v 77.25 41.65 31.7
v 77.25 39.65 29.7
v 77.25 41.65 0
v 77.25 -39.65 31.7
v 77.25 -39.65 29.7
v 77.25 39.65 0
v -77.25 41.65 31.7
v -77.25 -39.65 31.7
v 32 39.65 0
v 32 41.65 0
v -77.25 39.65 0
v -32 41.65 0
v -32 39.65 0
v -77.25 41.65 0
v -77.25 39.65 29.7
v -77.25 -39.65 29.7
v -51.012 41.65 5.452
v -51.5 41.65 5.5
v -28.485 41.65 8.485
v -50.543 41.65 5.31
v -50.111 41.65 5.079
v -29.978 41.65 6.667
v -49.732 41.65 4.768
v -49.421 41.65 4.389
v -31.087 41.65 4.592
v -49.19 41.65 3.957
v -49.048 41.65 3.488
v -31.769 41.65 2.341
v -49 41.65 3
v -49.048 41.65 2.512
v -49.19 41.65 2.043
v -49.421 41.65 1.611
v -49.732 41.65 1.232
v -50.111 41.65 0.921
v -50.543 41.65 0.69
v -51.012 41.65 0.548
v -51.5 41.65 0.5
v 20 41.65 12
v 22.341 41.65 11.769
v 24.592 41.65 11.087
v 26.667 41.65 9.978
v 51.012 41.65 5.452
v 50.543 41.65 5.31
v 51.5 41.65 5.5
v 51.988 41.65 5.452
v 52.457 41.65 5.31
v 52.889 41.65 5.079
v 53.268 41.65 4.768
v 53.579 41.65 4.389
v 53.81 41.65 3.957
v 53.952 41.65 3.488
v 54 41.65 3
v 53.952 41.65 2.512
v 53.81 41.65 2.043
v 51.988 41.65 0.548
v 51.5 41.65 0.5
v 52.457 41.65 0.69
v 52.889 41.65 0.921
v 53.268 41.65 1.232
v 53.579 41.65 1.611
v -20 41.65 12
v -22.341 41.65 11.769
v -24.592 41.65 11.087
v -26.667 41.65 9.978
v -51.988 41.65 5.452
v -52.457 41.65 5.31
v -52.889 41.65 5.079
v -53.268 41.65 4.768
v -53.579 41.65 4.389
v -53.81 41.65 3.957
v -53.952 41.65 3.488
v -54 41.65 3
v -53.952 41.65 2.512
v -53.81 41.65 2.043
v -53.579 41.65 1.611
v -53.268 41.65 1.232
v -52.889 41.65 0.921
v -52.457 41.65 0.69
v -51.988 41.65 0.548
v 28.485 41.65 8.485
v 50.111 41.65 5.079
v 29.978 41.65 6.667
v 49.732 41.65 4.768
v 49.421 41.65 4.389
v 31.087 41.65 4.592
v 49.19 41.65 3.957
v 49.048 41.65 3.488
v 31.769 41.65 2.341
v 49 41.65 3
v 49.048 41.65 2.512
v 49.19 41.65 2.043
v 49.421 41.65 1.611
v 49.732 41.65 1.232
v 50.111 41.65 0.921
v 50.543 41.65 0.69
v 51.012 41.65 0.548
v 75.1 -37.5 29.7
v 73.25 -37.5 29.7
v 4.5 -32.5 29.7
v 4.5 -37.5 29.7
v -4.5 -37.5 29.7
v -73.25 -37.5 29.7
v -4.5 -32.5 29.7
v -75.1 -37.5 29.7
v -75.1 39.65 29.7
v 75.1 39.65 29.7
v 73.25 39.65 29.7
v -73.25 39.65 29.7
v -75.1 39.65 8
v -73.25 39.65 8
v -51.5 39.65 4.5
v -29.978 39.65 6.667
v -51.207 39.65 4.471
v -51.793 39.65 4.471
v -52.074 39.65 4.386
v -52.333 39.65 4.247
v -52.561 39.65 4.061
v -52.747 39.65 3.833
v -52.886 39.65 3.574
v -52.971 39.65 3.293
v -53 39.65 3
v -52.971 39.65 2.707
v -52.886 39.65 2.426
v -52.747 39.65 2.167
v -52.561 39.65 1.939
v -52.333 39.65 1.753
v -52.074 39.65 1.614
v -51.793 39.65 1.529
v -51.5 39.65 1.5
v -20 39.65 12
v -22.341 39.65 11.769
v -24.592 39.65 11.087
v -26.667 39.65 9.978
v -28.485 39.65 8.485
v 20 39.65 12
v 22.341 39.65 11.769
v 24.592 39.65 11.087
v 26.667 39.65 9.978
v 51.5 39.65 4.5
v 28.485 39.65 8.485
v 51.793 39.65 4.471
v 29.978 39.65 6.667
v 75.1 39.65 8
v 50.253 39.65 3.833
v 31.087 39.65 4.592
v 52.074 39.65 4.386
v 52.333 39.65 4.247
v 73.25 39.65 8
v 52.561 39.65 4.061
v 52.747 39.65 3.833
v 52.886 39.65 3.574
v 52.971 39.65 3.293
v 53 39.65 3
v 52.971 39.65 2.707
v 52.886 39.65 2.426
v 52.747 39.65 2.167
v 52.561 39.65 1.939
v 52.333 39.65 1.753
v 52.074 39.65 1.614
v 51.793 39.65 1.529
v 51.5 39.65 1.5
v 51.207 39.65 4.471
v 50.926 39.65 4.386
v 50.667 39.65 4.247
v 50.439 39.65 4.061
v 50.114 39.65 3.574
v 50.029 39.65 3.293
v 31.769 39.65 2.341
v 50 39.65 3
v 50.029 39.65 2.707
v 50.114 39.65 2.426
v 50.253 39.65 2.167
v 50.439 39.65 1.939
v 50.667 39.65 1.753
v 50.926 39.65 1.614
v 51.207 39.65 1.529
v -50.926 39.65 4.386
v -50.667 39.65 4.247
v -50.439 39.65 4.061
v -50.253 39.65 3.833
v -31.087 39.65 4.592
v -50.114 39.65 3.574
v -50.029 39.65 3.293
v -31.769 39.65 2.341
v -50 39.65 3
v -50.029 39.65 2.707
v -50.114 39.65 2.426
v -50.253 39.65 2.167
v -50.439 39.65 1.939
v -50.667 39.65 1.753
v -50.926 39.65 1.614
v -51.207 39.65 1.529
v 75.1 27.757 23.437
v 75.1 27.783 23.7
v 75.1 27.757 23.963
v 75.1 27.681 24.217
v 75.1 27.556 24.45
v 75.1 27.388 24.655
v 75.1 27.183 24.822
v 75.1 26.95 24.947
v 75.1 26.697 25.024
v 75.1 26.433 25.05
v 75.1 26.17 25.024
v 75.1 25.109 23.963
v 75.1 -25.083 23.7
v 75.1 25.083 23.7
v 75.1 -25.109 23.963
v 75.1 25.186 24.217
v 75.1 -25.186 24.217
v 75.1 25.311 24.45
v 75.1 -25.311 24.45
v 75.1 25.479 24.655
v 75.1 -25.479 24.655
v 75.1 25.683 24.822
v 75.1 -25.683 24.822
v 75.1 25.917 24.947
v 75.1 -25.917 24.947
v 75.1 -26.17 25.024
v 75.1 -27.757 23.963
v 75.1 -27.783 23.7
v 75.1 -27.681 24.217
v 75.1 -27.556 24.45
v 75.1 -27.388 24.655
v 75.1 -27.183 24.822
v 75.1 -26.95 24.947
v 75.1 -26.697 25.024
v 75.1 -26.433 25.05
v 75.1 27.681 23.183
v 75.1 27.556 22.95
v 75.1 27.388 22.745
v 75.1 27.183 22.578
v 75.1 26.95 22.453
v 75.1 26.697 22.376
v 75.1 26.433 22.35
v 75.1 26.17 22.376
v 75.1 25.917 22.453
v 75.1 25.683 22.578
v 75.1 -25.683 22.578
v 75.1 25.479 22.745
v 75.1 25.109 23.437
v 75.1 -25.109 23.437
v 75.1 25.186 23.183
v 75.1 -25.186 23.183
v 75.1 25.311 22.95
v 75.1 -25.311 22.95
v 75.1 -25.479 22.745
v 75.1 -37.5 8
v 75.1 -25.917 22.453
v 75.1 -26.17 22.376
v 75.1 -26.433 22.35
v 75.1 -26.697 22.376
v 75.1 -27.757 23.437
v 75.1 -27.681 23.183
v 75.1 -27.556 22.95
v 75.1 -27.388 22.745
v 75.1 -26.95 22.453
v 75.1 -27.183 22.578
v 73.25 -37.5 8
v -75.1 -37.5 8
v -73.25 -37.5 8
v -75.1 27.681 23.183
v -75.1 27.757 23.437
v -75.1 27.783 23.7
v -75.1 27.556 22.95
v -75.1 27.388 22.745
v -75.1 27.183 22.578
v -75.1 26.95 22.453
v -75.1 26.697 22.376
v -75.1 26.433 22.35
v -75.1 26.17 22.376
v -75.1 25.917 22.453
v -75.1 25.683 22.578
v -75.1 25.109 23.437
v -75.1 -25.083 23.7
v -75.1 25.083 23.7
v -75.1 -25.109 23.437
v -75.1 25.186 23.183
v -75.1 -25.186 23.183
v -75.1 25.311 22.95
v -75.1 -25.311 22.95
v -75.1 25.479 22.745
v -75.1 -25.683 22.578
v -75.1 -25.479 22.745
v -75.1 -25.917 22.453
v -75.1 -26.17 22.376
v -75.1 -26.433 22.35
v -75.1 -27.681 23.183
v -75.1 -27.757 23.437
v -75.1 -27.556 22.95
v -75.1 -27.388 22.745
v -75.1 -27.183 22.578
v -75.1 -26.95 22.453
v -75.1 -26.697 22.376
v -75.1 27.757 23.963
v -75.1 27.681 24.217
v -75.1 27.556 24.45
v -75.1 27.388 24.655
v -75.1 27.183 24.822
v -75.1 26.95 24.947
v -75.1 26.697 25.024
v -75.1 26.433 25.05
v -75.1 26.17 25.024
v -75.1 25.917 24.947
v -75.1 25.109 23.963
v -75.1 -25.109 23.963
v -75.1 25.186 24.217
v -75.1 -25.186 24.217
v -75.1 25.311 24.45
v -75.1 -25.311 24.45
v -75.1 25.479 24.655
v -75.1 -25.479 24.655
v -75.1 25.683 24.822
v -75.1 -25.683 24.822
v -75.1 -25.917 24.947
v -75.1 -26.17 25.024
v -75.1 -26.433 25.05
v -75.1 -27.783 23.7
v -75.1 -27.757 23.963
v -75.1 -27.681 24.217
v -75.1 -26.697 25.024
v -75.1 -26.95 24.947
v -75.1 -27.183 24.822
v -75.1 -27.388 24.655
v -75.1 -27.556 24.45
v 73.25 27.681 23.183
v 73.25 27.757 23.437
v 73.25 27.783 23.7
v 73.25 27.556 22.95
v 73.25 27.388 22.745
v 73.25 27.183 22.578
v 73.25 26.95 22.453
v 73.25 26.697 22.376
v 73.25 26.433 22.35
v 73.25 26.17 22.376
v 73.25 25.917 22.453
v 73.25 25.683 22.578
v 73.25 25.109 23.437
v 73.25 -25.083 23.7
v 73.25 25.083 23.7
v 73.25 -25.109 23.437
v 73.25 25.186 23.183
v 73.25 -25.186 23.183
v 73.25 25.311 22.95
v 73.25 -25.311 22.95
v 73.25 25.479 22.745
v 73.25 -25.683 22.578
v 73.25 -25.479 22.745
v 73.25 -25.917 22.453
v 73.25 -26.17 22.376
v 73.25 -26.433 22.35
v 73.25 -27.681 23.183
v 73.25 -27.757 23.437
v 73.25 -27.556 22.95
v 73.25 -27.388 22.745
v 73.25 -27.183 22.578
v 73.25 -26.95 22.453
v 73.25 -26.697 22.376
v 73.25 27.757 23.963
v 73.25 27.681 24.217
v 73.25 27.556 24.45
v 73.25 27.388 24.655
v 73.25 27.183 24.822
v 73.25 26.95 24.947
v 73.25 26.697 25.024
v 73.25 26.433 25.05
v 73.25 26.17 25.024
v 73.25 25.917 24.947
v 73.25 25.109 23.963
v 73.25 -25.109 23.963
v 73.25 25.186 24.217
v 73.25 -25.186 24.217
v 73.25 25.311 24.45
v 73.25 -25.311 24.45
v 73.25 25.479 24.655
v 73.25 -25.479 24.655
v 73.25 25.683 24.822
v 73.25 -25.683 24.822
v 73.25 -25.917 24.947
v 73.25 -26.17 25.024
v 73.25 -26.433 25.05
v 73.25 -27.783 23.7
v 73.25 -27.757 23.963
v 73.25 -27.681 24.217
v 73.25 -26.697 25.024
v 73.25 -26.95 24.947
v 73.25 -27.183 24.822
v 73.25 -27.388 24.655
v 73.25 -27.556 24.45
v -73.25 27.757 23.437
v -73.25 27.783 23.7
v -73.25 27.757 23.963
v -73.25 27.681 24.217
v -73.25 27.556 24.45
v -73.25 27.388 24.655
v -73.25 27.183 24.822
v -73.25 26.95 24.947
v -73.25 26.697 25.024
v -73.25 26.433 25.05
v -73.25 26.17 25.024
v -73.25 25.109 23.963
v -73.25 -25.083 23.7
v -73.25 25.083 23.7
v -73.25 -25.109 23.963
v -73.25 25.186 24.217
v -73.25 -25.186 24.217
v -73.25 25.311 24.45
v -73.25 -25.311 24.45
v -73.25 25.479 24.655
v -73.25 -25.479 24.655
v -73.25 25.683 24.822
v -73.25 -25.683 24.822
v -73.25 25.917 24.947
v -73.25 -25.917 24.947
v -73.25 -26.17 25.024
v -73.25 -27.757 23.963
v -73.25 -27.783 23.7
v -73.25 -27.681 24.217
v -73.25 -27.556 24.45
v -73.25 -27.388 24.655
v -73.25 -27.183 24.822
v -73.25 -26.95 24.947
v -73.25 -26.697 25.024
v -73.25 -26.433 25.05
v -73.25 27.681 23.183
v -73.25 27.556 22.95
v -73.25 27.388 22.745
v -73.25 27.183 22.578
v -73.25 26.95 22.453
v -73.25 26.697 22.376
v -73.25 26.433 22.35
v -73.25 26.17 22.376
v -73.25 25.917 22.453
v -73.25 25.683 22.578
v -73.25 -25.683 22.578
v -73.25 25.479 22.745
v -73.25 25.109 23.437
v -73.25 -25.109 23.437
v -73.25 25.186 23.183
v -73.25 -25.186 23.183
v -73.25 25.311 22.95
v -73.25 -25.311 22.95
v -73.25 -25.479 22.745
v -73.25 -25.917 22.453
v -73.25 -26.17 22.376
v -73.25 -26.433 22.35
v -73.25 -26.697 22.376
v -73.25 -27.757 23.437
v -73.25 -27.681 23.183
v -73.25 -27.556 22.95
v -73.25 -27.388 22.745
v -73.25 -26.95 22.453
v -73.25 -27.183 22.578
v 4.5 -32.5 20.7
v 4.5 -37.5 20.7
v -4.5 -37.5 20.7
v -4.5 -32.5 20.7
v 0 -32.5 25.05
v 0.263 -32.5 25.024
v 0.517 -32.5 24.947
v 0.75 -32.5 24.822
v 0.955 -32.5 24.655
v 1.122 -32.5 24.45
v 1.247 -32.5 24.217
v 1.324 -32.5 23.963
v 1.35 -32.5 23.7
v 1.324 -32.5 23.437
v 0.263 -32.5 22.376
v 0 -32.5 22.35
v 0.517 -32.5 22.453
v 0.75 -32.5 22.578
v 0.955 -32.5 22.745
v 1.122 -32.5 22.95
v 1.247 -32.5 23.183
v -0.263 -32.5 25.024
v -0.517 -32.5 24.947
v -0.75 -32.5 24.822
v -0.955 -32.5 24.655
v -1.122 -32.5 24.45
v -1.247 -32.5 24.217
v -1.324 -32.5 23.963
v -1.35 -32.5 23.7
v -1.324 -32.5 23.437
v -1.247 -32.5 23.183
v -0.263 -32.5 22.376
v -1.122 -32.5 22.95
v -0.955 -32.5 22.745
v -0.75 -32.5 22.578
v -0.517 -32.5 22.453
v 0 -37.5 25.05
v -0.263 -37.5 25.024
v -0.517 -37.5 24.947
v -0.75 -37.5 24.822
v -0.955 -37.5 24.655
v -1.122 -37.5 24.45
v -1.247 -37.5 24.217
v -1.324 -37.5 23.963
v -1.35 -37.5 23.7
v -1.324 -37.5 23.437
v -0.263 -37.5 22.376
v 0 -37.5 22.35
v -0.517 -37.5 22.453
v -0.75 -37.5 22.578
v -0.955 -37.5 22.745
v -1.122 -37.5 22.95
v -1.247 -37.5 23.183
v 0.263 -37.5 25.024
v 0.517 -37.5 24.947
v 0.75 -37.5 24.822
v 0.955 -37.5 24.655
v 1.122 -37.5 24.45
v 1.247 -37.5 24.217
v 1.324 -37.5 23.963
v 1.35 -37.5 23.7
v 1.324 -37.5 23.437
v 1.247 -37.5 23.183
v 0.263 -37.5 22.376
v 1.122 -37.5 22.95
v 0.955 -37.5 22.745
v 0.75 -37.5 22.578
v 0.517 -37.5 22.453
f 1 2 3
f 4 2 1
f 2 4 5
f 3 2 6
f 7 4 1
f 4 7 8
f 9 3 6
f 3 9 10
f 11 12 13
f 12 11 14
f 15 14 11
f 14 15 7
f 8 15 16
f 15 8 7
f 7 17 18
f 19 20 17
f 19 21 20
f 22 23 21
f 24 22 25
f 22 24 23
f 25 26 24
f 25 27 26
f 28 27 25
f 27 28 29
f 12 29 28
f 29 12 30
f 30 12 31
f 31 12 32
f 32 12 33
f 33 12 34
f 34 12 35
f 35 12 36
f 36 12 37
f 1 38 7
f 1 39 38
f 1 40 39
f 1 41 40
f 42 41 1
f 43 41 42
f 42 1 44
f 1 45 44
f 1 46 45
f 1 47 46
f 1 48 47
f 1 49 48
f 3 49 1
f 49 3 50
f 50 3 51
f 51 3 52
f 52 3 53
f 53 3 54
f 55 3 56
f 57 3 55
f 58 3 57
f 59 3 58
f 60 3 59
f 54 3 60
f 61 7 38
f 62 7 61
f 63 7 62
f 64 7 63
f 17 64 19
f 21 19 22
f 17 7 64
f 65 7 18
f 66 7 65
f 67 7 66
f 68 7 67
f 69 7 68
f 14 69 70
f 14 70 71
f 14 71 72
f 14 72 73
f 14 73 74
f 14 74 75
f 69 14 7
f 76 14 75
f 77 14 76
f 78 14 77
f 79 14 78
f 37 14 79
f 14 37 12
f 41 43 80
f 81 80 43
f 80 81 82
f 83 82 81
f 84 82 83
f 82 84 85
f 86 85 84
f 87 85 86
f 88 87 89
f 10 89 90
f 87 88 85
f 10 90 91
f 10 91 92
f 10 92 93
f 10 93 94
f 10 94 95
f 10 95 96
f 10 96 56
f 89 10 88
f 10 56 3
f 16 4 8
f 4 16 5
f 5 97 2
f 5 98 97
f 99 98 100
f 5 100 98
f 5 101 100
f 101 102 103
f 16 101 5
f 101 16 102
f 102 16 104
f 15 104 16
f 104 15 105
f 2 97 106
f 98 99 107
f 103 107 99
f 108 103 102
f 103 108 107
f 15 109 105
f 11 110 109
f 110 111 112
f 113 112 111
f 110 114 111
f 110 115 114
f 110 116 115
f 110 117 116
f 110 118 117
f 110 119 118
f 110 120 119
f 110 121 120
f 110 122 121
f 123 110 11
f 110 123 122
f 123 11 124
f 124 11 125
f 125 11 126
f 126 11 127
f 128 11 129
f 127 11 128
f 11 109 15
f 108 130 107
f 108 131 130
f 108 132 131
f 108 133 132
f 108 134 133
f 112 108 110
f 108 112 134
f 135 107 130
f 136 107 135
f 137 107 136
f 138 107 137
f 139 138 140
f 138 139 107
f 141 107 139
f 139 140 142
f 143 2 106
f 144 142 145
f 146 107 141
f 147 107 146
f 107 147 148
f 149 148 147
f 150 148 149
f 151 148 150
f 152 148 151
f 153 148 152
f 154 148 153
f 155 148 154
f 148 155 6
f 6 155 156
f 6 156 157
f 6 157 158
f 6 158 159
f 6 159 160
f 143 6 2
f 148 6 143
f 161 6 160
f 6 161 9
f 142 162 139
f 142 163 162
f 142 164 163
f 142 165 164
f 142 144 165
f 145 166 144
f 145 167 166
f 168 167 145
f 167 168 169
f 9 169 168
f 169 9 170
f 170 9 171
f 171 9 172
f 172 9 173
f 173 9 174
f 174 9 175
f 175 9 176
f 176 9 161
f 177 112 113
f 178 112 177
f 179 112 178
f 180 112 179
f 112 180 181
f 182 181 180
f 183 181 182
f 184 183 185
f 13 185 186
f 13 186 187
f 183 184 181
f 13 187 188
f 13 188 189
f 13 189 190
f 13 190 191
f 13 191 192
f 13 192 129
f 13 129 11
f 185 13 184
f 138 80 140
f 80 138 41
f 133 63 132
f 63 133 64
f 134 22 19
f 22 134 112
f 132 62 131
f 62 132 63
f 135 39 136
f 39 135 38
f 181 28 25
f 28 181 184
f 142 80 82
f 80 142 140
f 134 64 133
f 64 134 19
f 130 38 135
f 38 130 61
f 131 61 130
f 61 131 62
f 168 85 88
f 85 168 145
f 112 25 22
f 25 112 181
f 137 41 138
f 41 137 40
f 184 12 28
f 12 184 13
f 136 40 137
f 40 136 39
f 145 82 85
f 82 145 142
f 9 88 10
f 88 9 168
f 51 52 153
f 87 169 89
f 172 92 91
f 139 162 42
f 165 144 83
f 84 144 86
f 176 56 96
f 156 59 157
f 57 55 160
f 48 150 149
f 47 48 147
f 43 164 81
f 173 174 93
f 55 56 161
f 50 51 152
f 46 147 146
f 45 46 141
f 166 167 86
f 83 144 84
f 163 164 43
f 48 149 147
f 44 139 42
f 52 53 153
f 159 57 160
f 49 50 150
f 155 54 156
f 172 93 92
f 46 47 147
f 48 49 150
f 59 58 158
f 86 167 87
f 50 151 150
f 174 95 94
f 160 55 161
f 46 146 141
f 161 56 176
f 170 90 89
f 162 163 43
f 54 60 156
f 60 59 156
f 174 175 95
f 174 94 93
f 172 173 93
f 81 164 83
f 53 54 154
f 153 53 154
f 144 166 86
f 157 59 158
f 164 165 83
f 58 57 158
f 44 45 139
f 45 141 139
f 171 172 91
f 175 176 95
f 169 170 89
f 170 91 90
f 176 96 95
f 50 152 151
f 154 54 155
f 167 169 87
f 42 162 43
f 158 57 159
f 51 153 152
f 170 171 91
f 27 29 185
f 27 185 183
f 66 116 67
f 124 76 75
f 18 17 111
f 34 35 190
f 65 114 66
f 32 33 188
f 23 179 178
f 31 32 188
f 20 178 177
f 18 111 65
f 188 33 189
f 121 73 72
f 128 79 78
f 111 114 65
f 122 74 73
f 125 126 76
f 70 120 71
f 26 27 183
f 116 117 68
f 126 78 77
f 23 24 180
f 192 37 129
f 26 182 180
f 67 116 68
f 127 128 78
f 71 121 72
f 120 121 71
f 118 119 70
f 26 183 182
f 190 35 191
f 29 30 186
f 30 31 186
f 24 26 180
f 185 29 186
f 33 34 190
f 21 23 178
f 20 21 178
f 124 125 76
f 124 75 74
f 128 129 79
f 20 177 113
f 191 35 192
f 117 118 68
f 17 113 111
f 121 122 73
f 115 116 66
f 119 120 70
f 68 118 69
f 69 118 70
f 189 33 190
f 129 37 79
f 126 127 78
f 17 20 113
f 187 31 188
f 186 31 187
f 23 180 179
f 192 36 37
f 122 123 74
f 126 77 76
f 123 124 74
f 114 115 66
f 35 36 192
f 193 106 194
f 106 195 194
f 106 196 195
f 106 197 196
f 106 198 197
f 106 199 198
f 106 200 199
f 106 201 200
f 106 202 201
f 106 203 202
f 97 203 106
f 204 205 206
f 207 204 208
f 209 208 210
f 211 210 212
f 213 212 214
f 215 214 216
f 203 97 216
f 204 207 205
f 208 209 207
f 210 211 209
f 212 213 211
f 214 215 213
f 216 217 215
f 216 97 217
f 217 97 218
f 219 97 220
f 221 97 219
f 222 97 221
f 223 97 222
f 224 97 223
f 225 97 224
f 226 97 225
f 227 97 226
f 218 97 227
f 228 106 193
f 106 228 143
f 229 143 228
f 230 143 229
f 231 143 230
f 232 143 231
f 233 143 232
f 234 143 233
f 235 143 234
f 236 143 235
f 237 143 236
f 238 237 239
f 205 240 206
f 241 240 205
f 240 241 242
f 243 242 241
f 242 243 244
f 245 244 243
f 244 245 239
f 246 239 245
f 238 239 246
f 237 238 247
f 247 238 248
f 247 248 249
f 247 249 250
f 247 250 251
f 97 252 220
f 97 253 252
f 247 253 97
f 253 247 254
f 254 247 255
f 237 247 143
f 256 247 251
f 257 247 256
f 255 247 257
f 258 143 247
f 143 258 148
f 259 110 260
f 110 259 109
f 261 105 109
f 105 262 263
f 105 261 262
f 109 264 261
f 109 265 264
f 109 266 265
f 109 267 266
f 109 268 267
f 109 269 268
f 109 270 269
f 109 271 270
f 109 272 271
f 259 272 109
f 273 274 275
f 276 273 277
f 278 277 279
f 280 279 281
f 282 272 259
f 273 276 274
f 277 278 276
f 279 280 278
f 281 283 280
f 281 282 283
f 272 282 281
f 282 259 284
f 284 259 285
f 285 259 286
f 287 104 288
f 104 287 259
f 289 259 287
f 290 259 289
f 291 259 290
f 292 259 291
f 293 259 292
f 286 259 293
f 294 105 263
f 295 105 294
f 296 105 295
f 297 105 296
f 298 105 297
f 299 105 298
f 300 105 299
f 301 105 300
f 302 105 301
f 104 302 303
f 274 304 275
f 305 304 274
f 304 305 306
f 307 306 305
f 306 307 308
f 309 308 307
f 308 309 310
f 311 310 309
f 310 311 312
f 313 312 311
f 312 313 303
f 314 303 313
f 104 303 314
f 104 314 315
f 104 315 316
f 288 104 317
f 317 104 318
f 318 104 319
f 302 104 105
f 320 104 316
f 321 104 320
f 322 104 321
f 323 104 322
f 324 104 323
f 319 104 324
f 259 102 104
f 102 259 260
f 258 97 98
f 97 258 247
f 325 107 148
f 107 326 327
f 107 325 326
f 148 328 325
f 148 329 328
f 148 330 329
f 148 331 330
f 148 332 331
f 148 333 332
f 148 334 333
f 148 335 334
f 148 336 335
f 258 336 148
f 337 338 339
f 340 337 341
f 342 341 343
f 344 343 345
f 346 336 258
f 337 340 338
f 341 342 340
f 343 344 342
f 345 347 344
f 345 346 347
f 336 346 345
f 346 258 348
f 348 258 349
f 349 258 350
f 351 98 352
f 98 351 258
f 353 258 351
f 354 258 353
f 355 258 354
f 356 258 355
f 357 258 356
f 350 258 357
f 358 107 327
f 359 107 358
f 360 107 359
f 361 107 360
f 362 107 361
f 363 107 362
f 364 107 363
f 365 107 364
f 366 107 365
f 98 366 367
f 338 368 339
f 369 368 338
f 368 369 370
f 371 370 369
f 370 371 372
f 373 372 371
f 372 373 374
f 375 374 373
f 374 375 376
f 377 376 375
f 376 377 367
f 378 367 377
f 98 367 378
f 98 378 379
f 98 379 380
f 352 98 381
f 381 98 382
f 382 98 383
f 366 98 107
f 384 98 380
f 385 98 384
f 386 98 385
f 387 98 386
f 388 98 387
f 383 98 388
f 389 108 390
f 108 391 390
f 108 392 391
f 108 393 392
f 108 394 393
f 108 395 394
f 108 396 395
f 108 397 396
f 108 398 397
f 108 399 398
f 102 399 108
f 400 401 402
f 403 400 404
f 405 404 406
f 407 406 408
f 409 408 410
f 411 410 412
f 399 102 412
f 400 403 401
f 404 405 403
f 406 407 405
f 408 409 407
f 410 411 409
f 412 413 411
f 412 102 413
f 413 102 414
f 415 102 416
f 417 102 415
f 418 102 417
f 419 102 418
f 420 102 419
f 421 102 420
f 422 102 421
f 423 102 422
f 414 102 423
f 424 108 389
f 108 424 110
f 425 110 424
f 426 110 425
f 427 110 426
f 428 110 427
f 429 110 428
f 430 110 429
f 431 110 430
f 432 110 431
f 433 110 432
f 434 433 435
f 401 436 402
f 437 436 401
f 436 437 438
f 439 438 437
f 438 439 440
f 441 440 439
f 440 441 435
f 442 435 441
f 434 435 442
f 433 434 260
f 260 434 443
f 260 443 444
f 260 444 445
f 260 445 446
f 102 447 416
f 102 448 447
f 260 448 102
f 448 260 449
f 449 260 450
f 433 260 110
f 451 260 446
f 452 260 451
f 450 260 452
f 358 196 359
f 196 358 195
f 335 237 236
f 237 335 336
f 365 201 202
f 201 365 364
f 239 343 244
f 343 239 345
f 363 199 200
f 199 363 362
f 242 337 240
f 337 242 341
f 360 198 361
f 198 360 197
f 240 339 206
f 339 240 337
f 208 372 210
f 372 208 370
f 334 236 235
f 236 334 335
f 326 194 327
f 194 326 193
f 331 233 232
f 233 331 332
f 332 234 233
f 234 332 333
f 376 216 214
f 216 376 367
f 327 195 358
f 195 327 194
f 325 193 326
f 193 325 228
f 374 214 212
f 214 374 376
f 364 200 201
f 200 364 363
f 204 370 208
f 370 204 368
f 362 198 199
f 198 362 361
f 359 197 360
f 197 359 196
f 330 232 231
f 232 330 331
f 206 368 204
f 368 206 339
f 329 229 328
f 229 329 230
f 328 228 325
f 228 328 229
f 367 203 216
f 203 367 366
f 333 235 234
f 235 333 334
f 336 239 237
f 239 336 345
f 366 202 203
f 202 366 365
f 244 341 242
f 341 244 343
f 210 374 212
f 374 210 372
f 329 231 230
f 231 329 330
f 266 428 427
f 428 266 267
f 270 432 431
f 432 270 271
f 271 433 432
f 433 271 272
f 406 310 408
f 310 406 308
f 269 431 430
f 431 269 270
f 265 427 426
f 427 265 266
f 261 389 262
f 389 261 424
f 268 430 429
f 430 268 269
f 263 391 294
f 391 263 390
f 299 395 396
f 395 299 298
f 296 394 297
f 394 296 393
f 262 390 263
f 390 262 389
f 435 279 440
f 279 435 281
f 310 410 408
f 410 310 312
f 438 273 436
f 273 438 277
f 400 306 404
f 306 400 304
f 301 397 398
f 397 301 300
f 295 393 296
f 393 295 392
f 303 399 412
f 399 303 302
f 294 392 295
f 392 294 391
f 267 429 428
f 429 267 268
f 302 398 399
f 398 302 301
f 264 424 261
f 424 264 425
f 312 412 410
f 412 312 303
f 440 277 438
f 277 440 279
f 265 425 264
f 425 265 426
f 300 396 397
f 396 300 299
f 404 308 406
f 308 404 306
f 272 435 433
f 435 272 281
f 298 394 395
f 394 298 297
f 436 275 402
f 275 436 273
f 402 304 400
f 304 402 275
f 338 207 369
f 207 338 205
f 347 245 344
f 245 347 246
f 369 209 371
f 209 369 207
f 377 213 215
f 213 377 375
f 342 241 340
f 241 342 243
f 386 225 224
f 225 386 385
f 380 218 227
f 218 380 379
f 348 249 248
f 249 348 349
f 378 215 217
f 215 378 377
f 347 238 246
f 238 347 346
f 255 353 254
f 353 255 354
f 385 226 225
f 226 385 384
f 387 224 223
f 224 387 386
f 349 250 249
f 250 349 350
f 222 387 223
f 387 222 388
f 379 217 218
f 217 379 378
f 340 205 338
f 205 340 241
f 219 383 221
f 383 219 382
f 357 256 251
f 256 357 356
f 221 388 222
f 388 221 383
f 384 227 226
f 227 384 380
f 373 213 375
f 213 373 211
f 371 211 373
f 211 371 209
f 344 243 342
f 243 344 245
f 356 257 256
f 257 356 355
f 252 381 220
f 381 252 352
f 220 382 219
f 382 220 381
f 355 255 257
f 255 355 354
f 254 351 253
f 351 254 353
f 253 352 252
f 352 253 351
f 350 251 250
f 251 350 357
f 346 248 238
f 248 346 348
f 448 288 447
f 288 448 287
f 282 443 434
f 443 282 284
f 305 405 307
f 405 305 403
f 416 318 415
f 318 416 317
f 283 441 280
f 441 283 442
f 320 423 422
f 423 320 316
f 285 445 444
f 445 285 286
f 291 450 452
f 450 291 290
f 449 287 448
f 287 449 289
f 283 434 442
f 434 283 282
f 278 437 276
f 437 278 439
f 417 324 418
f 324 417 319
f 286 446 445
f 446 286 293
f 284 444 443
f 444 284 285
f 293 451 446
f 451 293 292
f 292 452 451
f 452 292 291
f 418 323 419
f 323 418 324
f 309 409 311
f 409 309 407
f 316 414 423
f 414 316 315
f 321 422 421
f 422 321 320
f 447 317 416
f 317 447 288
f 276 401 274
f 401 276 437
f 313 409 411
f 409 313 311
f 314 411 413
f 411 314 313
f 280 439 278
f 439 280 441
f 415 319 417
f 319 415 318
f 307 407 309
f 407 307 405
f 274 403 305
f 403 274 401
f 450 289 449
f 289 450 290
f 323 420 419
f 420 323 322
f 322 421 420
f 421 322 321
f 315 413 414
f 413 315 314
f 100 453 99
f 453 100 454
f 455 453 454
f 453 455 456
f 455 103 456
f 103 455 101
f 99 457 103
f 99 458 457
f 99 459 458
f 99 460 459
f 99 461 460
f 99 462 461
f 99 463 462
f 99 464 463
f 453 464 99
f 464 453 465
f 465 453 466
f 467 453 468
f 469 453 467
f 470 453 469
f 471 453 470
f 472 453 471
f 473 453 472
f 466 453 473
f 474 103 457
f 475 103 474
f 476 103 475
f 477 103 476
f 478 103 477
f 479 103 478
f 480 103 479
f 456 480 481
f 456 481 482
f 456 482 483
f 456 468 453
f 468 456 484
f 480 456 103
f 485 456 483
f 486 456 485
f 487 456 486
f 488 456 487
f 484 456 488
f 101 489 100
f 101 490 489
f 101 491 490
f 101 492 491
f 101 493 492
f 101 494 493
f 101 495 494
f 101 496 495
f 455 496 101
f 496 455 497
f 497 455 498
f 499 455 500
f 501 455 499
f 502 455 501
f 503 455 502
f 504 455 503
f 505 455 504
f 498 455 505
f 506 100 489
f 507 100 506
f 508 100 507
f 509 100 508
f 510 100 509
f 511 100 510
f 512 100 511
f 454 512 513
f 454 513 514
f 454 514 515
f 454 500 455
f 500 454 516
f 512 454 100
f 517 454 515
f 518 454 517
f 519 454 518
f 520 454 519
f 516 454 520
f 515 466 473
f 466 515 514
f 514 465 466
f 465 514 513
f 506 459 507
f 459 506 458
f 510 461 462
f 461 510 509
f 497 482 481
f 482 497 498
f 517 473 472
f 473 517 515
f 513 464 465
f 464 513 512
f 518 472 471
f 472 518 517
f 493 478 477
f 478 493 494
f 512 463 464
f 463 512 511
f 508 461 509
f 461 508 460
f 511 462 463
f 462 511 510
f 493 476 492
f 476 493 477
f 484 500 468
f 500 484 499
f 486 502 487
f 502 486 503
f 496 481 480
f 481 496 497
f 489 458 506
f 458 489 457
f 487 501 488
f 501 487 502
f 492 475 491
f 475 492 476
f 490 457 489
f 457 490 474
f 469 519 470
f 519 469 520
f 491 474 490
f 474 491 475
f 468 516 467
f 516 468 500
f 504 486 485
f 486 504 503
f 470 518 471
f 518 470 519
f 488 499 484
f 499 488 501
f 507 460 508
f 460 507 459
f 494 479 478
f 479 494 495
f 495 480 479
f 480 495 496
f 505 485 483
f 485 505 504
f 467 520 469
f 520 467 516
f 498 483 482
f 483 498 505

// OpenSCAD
// file: ../parameter.scad
//----------------Global Parameter---------------------------------------
nema17_height=40;
nema17_width=42;
nema17_shftDia=5;
nema17_shftLen=28;
nema17_holeDist=31;
Nema17_gearDia=23;

slotWthick=4;
//-------Parameter triplePytho------------------------------------------------

strScale=800;
strDia=3.5;
strPosX=20;
strPosY=-20;
slotXY=20;
nStr=3;


tuner_bDi=8;
tuner_bDo=22.2;
tuner_bZ=10;
tuner_rThick=5;
tuner_tDia=strPosX*2;// (big)
//tuner_tDia=tuner_bDo+8;// (small)
tuner_leverZ=10;
tuner_zPos=225;
tuner_strDia=strDia[0];
tuner_leverY=35;

//----------Kickup----------------------------------------------------

kickup_baseX=17;
kickup_baseY=13;
kickup_zAdjDia=3.3;
kickup_zAdjL=10;
kickup_zAdjDist=10.5;
kickup_zAdjOff=4;
//------------------------------------------------------------------------

slide_cpDst=1.5;
slide_rackPosX=(55-12.5);

m3Dia=3.3;
m3NutD=6.6;
m4Dia=4.3;
m4NutD=8.3;
m4NutZ=5;
m5Dia=5.3;
m5HeadD=9.6;

edgeR=3;

mnt_pcbA_X=157;
mnt_pcbA_Y=101;

//---------End Parameter triplePytho-----------------------------------------------


//-------Parameter GHarp----------------------------------------------------

//strScale=650;
//strDia=3;
//strPosX=20;
//strPosY=-20;
//slotXY=20;
//nStr=3;
//
//
//
//tuner_bDi=8;
//tuner_bDo=22.2;
//tuner_bZ=10;
//tuner_rThick=5;
////tuner_tDia=strPosX*2; (big)
//tuner_tDia=strPosX*2-10;
//tuner_leverZ=10;
//tuner_zPos=225;
//tuner_strDia=strDia[0];
//tuner_leverY=35;
//
////----------Kickup----------------------------------------------------
//
//kickup_baseX=17;
//kickup_baseY=13;
//kickup_zAdjDia=3.3;
//kickup_zAdjL=10;
//kickup_zAdjDist=10.5;
//kickup_zAdjOff=4;
////------------------------------------------------------------------------
//
//slide_cpDst=1.5;
//slide_rackPosX=(55-12.5);
//
//m3Dia=3.3;
//m3NutD=6.6;
//m4Dia=4.3;
//m4NutD=8.3;
//m4NutZ=5;
//m5Dia=5.3;
//m5HeadD=9.6;
//
//edgeR=3;
//
//gearXPos=57;
//gearYPos=0;
//gearZPos=360;
//
//rackScrD=20;
//rack_X=13;
//rack_Y=15.5;
//rack_extOffX=0;
//
//bearGearD=25;
//mntGrD=20.5; //mount gear distance
//
//mnt_pcbA_X=157;
//mnt_pcbA_Y=101;

//---------End Parameter GHarp-----------------------------------------------


//-------Parameter Bass----------------------------------------------------

//strScale=650;
//strDia=4;
//strPosX=20;
//strPosY=-20;
//slotXY=20;
//
//
//
//tuner_bDi=8;
//tuner_bDo=22.2;
//tuner_bZ=10;
//tuner_rThick=5;
////tuner_tDia=strPosX*2; (big)
//tuner_tDia=strPosX*2;
//tuner_leverZ=10;
//tuner_zPos=225;
//tuner_strDia=strDia[0];
//tuner_leverY=35;
//
////----------Kickup----------------------------------------------------
//
//
//kickup_baseX=22;
//kickup_baseY=15;
//kickup_zAdjDia=3.3;
//kickup_zAdjL=10;
//kickup_zAdjDist=13;
//kickup_zAdjOff=4;
//
//
//slide_cpDst=1.5;
//slide_rackPosX=(55-12.5);
//
//m3NutD=6.6;
//m4Dia=4.3;
//m4NutD=8.3;
//m5Dia=5.3;
//
//edgeR=3;
//
//gearXPos=57;
//gearYPos=0;
//gearZPos=360;
//
//rackScrD=20;
//rack_X=13;
//rack_Y=15.5;
//rack_extOffX=0;
//
//bearGearD=25;
//mntGrD=20.5; //mount gear distance
//
////---------End Bass-----------------------------------------------
// file: ../actuators/act_kickup.scad
include <../parameter.scad>
strSpanB=10;
bodySlotX=100;
diameter=16;

//kickup(3);
//cap();

module kickup(orient){
$fn=32;

wall=2;
coilZ=15;
bottomZ=2;
t=0.3;
ySpacing=12;

bX = slotXY;
bY=ySpacing+diameter+wall;
bZ=coilZ+bottomZ+t;

tX = bX;
tY=bY;
hub=3;
magZ=3.1;
tbottomZ=3;
tZ=hub+magZ+tbottomZ;
tDia=6.7;//6.5;
screwTdia=4.3;

conMntX=2.54;
conMntY=6.3;
conMntZ=12;
conWt=1.5;

screwMdia=3;
screwMHDia=5.5;
screwMHh=1.8;
screwAdia=4.3;

mntTh=3;
mX=bX+slotXY+mntTh+0.3;


module mnt(){
difference(){
    union(){
        translate([-mX/2+bX/2,0,-mntTh])rcube([mX,bY,mntTh],3);
        translate([-mX+bX/2+mntTh/2,0,-mntTh])rcube([mntTh,bY,bZ+mntTh+tZ],0.1);
    }
    hull(){
    translate([-bX/2-slotXY,0,slotXY/2])rotate([0,-90,0])cylinder(d=m5Dia,h=bZ,center=true);
    translate([-bX/2-slotXY,0,(bZ+tZ)-m5Dia*1.5])rotate([0,-90,0])cylinder(d=m5Dia,h=bZ,center=true);
    }
    
    translate([0,bY/2-(bY-diameter)/4,-mntTh-0.01])cylinder(d2=screwMdia,d1=screwMHDia,h=screwMHh);
		translate([0,bY/2-(bY-diameter)/4,-mntTh-1])cylinder(d=screwMdia,h=mntTh*2);

    translate([0,-(bY/2-(bY-diameter)/4),-mntTh-0.01])cylinder(d2=screwMdia,d1=screwMHDia,h=screwMHh);
    translate([0,-(bY/2-(bY-diameter)/4),-mntTh-1])cylinder(d=screwMdia,h=bZ);
    
    translate([0,0,-mntTh-1])cylinder(d=screwMdia*2+4,h=bZ);
    translate([-bX/2+conMntX/2,0,0])cube([conMntX+conWt,conMntY+conWt,conMntZ],center=true);
}
}

module base(){
$fn=16;
cableDia=2;
difference(){
    union(){
        translate([0,0,0])rcube([bX,bY,bZ],3);
        //translate([bX/2+(conMntX+conWt)/2,0,0])rcube([conMntX+conWt,conMntY+conWt*2,conMntZ],0.1);  
    }

translate([bX/2-(conMntX)/2+1,0,0])rcube([conMntX+2,conMntY,conMntZ],0.1); 
translate([0,0,0]){
translate([0,0,bottomZ])rotate([0,0,30])cylinder(d=diameter,h=100,$fn=6);
translate([0,0,0])cylinder(d=screwAdia,h=100);
translate([0,0,conMntZ-cableDia/2])rotate([0,90,0])cylinder(d=cableDia,h=100);
}
translate([0,bY/2-(bY-diameter)/4,0])cylinder(d=screwMdia-0.2,h=bZ);
translate([0,-bY/2+(bY-diameter)/4,0])cylinder(d=screwMdia-0.2,h=bZ);
}
}

module top(){
$fn=16;
difference(){
translate([0,0,0])rcube([tX,tY,tZ],3);

translate([0,0,0]){

translate([0,0,-tbottomZ])cylinder(d=tDia,h=tZ);
cylinder(d=screwTdia,h=tZ);
}
translate([0,bY/2-(bY-diameter)/4,tZ])rotate([180,0,0])cylinder(d1=screwMHDia,d2=screwMdia,h=screwMHh);
translate([0,bY/2-(bY-diameter)/4,0])cylinder(d=screwMdia+0.3,h=tZ);
translate([0,-bY/2+(bY-diameter)/4,tZ])rotate([180,0,0])cylinder(d1=screwMHDia,d2=screwMdia,h=screwMHh);
translate([0,-bY/2+(bY-diameter)/4,0])cylinder(d=screwMdia+0.3,h=tZ);
}
}


module rcube(size,radius){
linear_extrude(height=size[2])
if(radius>0){
hull()
{
    // place 4 circles in the corners, with the given radius
    translate([(-size[0]/2)+(radius), (-size[1]/2)+(radius), 0])
    circle(r=radius);

    translate([(size[0]/2)-(radius), (-size[1]/2)+(radius), 0])
    circle(r=radius);

    translate([(-size[0]/2)+(radius), (size[1]/2)-(radius), 0])
    circle(r=radius);

    translate([(size[0]/2)-(radius), (size[1]/2)-(radius), 0])
    circle(r=radius);
}
}
if(radius==0){
translate([0,0,size[2]/2])cube(size,center=true);
}
}




module coil(){
$fn=32;
magholedia=4;
wallthick=0.5;
loweridlerZ=1.8;
upperidlerZ=1.8;
rampBZ=0.2;
rampTZ=0.2;
coildia=diameter-0.5;
rampdia=coildia;
threaddepth=5;
roofZ=loweridlerZ;

difference(){
union(){
cylinder(d=magholedia+wallthick*2,h=coilZ);
translate([0,0,loweridlerZ])cylinder(d1=rampdia,d2=magholedia+wallthick*2,h=rampBZ,$fn=6);
translate([0,0,coilZ-upperidlerZ-rampTZ])cylinder(d2=rampdia/100*100,d1=magholedia+wallthick*2,h=rampTZ,$fn=6);
translate([0,0,coilZ-upperidlerZ])cylinder(d=coildia/100*100,h=upperidlerZ,,$fn=6);
//Ccube([coildia,coildia,upperidlerZ],[0,0,1]);
translate([0,0,0]){
//Ccube([coildia,coildia,loweridlerZ],[0,0,1]);
cylinder(d=coildia,h=loweridlerZ,$fn=6);

}
}

translate([0,0,-roofZ])cylinder(d=magholedia,h=coilZ);
//cylinder(d=coilthreaddia,h=coilZ+1);
}}


if(orient==0){
translate([-slotXY/2,-(slotXY/2+bX/2),0])rotate([-90,0,-90]){
rotate([0,0,180]){
base();
translate([0,0,bZ])rotate([0,0,0])top();
}
mnt();
//translate([0,tY+0,0])rotate([30,0,0])rotate([0,90,0])coil();
}
}

if(orient==1){
base();
translate([0,tY+28,tZ])rotate([180,0,0])top();
translate([0,tY+0,0])rotate([30,0,0])rotate([0,90,0])coil();
}
if(orient==2){
translate([0,0,-bZ-tZ]){
rotate([0,0,180]){
base();
translate([0,0,bZ])rotate([0,0,0])top();
}
mnt();
//translate([0,tY+0,0])rotate([30,0,0])rotate([0,90,0])coil();
}
}

if(orient==3){
translate([0,0,0]){
mnt();
//translate([0,tY+0,0])rotate([30,0,0])rotate([0,90,0])coil();
}
}
}

module cap(){
i_dia=3.8;
o_dia=13.5;
	h=4;
$fn=32;
//headZ=4;
difference(){
union(){
difference(){
sphere(d=o_dia);
translate([0,0,-o_dia/2])cube([o_dia,o_dia,o_dia],center=true);}
translate([0,0,-h])cylinder(d=o_dia,h=h);
}
translate([0,0,-h])cylinder(d=i_dia,h=h+o_dia/3);
//scale([1,1,0.5])sphere(d=i_dia);
}
}
// file: ../libs/T-Slot.scad
/** 
 * @file
 * Generic library for fractional T-Slot extrusions.
 *
 * Creative Commons Share Alike 3.0
 * Copyright (c) 2014 Manuel García
 *
 * Original library (David Lee Miller)
 * https://www.thingiverse.com/thing:136430
 */ 

ProfileCore = 4.3;     // Profile core Ø (Default M5).
minkR_TS = 0.04 * 20;  // Minkowski radius for the T-Slot.
minkR_IC = 0.075 * 20; // Minkowski radius for the inner cutout.
minkR_PF = 0.05 * 20;  // Minkowski radius for the profile corners.

//2020Profile(100);
//2040Profile(100);
//2060Profile(100);
//2080Profile(100);
//4040Profile(100);
//4060Profile(100);
//4080Profile(100);

module fillet(rad) {
  translate([-rad, -rad, 0])
  difference() {
    translate([0, 0, 0]) square([rad + 0.01, rad + 0.01]);
    circle(r = rad, $fn = 32);
  }
}

module insideCutout() {
  minkowski() {
    translate([0, 0, 0]) circle(r = minkR_IC, center = true, $fn = 32);
    hull() {
      square([0.2 * 20 - minkR_IC, 0.645 * 20 - 2 * minkR_IC], center = true);
      square([0.8 * 20 - 2 * minkR_IC, 0.001 * 20], center = true);
    }
  }
}

module doubleCutout() {
  union() {
    minkowski() {
      translate([0, 0, 0]) circle(r = minkR_IC, center = true, $fn = 32);
      union() {
        rotate([0, 0, 0]) hull() {
          translate([-0.5 * 20, 0, 0]) hull() {
            square([0.2 * 20 - minkR_IC, 0.645 * 20 - 2 * minkR_IC], center = true);
            square([0.8 * 20 - 2 * minkR_IC, 0.001 * 20], center = true);
          }
          translate([0.5 * 20, 0, 0]) hull() {
            square([0.2 * 20 - minkR_IC, 0.645 * 20 - 2 * minkR_IC], center = true);
            square([0.8 * 20 - 2 * minkR_IC, 0.001 * 20], center = true);
          }
        }
        rotate([0, 0, 90]) hull() {
          translate([-0.5 * 20, 0, 0]) hull() {
            square([0.2 * 20 - minkR_IC, 0.645 * 20 - 2 * minkR_IC], center = true);
            square([0.8 * 20 - 2 * minkR_IC, 0.001 * 20], center = true);
          }
          translate([0.5 * 20, 0, 0]) hull() {
            square([0.2 * 20 - minkR_IC, 0.645 * 20 - 2 * minkR_IC], center = true);
            square([0.8 * 20 - 2 * minkR_IC, 0.001 * 20], center = true);
          }
        }
      }
    }
    rotate([0, 0, 0]) translate([-0.645 * 20 / 2, -0.645 * 20 / 2, 0]) fillet(minkR_IC);
    rotate([0, 0, 180]) translate([-0.645 * 20 / 2, -0.645 * 20 / 2, 0]) fillet(minkR_IC);
    rotate([0, 0, 90]) translate([-0.645 * 20 / 2, -0.645 * 20 / 2, 0]) fillet(minkR_IC);
    rotate([0, 0, -90]) translate([-0.645 * 20 / 2, -0.645 * 20 / 2, 0]) fillet(minkR_IC);
  }
}

module tSlot() {
  union() {
    translate([minkR_TS, 0, 0])
    minkowski() {
      translate([0, 0, 0]) circle(r = minkR_TS, $fn = 32);
      hull() {
        square([0.001 * 20, 0.585 * 20 - 2 * minkR_TS], center = true);
        translate([(0.233 * 20 - 2 * minkR_TS) / 2, 0, 0]) square([0.233 * 20 - 2 * minkR_TS, 0.2 * 20], center = true);
      }
    }
    translate([-0.255 * 20 / 2 + 0.01, 0, 0]) square(0.255 * 20, center = true);
    translate([-0.35 * 20 / 2 - 0.087 * 20 + 0.01, 0, 0]) square(0.35 * 20, center = true);
    translate([0, -0.255 * 20 / 2, 0]) fillet(minkR_TS / 2);
    translate([-0.087 * 20, -0.255 * 20 / 2, 0]) rotate([0, 0, 90]) fillet(minkR_TS / 2);
    scale([1, -1, 1]) translate([0, -0.255 * 20 / 2, 0]) fillet(minkR_TS / 2);
    scale([1, -1, 1]) translate([-0.087 * 20, -0.255 * 20 / 2, 0]) rotate([0, 0, 90]) fillet(minkR_TS / 2);
  }
}

module 2020Profile(height, core = ProfileCore) {
  linear_extrude(height = height, center = true)
  union() {
    difference() {
      minkowski() {
        translate([0, 0, 0]) circle(r = minkR_PF, $fn = 32);
        square([1 * 20 - 2 * minkR_PF, 1 * 20 - 2 * minkR_PF], center = true);
      }
      translate([0, 0, 0]) circle(r = core / 2, $fn = 24);
      translate([-0.5 * 20 + 0.087 * 20, 0, 0]) tSlot();
      rotate([0, 0, 180]) translate([-0.5 * 20 + 0.087 * 20, 0, 0]) tSlot();
      translate([0, -0.5 * 20 + 0.087 * 20, 0]) rotate([0, 0, 90]) tSlot();
      translate([0, 0.5 * 20 - 0.087 * 20, 0]) rotate([0, 0, -90]) tSlot();
    }
  }
}
// main file
include <../libs/T-Slot.scad>
include <../actuators/act_kickup.scad>

slotWH=20;
slotAH=500;
slotBH=250;
drmDia=375;
drmH=120;
slotADist=200;
slotWT = 3.5; //slot wall thickness 

difference(){
	//cylinder(d=drmDia, h=drmH);
	//translate([0,0,drmH-10])cylinder(d=drmDia-10, h=drmH);
}

//translate([slotADist/2,-slotAH/2,-slotWH/2])rotate([-90,0,0])rcube([slotWH,slotWH,slotAH],1);
//translate([-slotADist/2,-slotAH/2,-slotWH/2])rotate([-90,0,0])rcube([slotWH,slotWH,slotAH],1);
//translate([slotADist/2,-slotAH/2,slotWH/2+drmH])rotate([-90,0,0])rcube([slotWH,slotWH,slotAH],1);
//translate([-slotADist/2,-slotAH/2,slotWH/2+drmH])rotate([-90,0,0])rcube([slotWH,slotWH,slotAH],1);
//
//translate([slotBH/2,(drmDia/2+slotWH/2+5),-slotWH/2+drmH])rotate([0,-90,0])rcube([slotWH,slotWH,slotBH],1);
//translate([slotBH/2,-(drmDia/2+slotWH/2+5),-slotWH/2+drmH])rotate([0,-90,0])rcube([slotWH,slotWH,slotBH],1);

//translate([0,-slotAH/2,slotWH/2+drmH+10])rotate([-90,0,0])rcube([slotWH,slotWH,slotAH],1);

//translate([0,0,0])drmClmp();

//translate([0,90,145])rotate([0,90,90])kickup(0);
//translate([0,0,250])rotate([0,90,90])palm();

//put_together();
pcbMnt();

module put_together(){
	translate([0,0,0])drmClmp();
	translate([0,90,0])rotate([0,90,90])kickup(0); 
}
	
module pcbMnt(){
    pcbW =150.5;
    pcbD = 77.3;
    pcbH = 1.7; //pcb height
    pcbHU= 22; //pcb headroom up
    pcbHD=4; //pcb headroom down
    wTW = 2;
    wTD = 2;
    bttmH = 2;
		topH = 2;
    w = pcbW+wTW*2;
    d = pcbD+wTD;
    h = bttmH + pcbH + pcbHU + pcbHD;
    scrwM5D=5.3;
    scrwM3D=3;
		scrwLidP = 6;
    brrlCD = 9;
    midiCD= 7;
    usbW= 12;
    usbH= 8;
    $fn=16;
 
//a();
b();
	
module b(){
	tolW = 0.3;
	tolH = 0.3;
	tolD = 0.15;
	cableCH = 12;
	cableCW = 40;
	$fn = 32; 
	difference(){
		translate([0,wTD/2,0])rcube([w,d+wTD,h+topH],0);
		translate([0,0,0])rcube([w,d,h],0);
		hull(){
			translate([-cableCW/2,d/2,0])rotate([90,0,0])cylinder(d=cableCH*2,h=wTD*3,center=true);
			translate([cableCW/2,d/2,0])rotate([90,0,0])cylinder(d=cableCH*2,h=wTD*3,center=true);
		}

		
		translate([0,d/2+wTD,(bttmH+pcbHD)/2])rotate([90,0,0])cylinder(d1=5,d2=scrwM3D,h=wTD);
		translate([w/3,d/2+wTD,(bttmH+pcbHD)/2])rotate([90,0,0])cylinder(d1=5,d2=scrwM3D,h=wTD);
		translate([-w/3,d/2+wTD,(bttmH+pcbHD)/2])rotate([90,0,0])cylinder(d1=5,d2=scrwM3D,h=wTD);
	}
	difference(){
		translate([0,wTD/2+tolD/2,bttmH+pcbHD+pcbH+tolH])rcube([w-wTW*2-tolW,d-wTD-tolD,h-bttmH-pcbHD-pcbH-tolH],0);
		translate([0,0,0])rcube([w-wTW*4,d,h],0);
		
		translate([w/2,d/3,h-scrwLidP])rotate([0,-90,0])cylinder(d=scrwM3D-0.3,h=wTW*2);
		translate([-(w/2),d/3,h-scrwLidP])rotate([0,90,0])cylinder(d=scrwM3D-0.3,h=wTW*2);
		translate([w/2,-d/3,h-scrwLidP])rotate([0,-90,0])cylinder(d=scrwM3D-0.3,h=wTW*2);
		translate([-(w/2),-d/3,h-scrwLidP])rotate([0,90,0])cylinder(d=scrwM3D-0.3,h=wTW*2);	
	}
	difference(){
		translate([0,-d/2+wTD+2.5+tolD,h-9])rcube([9,5,9],0);
		translate([0,-d/2+tolD,h-6])rotate([-90,0,0])cylinder(d=scrwM3D-0.3,h=10);
	}

	
}
module a(){	
    difference(){
        rcube([w,d,h],0);
        translate([0,wTD/2,bttmH+pcbHD])rcube([pcbW,pcbD,bttmH+pcbH+pcbHU+pcbHD],0);
        translate([0,wTD/2,bttmH])rcube([pcbW-4,pcbD-4,bttmH+pcbH+pcbHU+pcbHD],0);
        
        translate([w/2,d/3,h-scrwLidP])rotate([0,-90,0])cylinder(d1=5.5,d2=scrwM3D,h=wTW);
        translate([-(w/2),d/3,h-scrwLidP])rotate([0,90,0])cylinder(d1=5.5,d2=scrwM3D,h=wTW);
        translate([w/2,-d/3,h-scrwLidP])rotate([0,-90,0])cylinder(d1=5.5,d2=scrwM3D,h=wTW);
        translate([-(w/2),-d/3,h-scrwLidP])rotate([0,90,0])cylinder(d1=5.5,d2=scrwM3D,h=wTW);
        
        translate([-pcbW/2+10.1,-d/2,bttmH+pcbHD+pcbH+6.8])rotate([-90,0,0])cylinder(d=brrlCD,h=wTD*2);
        translate([-pcbW/2+22,-d/2,bttmH+pcbHD+pcbH+6.8])rotate([-90,0,0])cylinder(d=brrlCD,h=wTD*2);
         
        translate([-pcbW/2+39.3,-d/2,bttmH+pcbHD+pcbH+3])rotate([-90,0,0])cylinder(d=midiCD,h=wTD*2);
        translate([-pcbW/2+39.3+13.8,-d/2,bttmH+pcbHD+pcbH+3])rotate([-90,0,0])cylinder(d=midiCD,h=wTD*2);
        
        translate([-pcbW/2+93.2,-d/2,bttmH+pcbHD+pcbH+13.3-usbH/2])rcube([usbW,wTD*2,usbH],0);
        
        translate([0,-d/2,h-6])rotate([-90,0,0])cylinder(d1=5.5,d2=scrwM3D,h=wTD);
        
				translate([0,d/2,(bttmH+pcbHD)/2])rotate([90,0,0])cylinder(d=scrwM3D-0.4,h=10);
				translate([w/3,d/2,(bttmH+pcbHD)/2])rotate([90,0,0])cylinder(d=scrwM3D-0.4,h=10);
				translate([-w/3,d/2,(bttmH+pcbHD)/2])rotate([90,0,0])cylinder(d=scrwM3D-0.4,h=10);
    }
    
    difference(){
    translate([0,0,-slotWH])rcube([slotWH+slotWT*2,d,slotWH],0);
    translate([0,0,-slotWH])rcube([slotWH+0.25,d,slotWH],0);    
    translate([0,0,-slotWH/2])rotate([0,90,0])cylinder(d=scrwM5D, h=slotWH*2,center=true);  
    }
	}
}
module drmClmp(){
	$fa = 3;
	w=100;
	d=4;
	hB=12;
	doW=400;
	angle=30;
	ovrSnr=10;
	wt=2.5;
	scrwADia=5;
	scrwBDia=8;
	

	
	difference(){
			rcube([slotWH*2.5,slotWH,slotWH+wt*2],3);
			translate([0,slotWH,slotWH/2+wt])rotate([90,0,0])rcube([slotWH+0.1,slotWH+0.1,slotWH*2],1);
			translate([0,0,0])cylinder(d=scrwADia+0.3, h=slotWH*2);
			translate([-slotWH*0.875,0,0])cylinder(d=scrwBDia+0.1, h=slotWH*2);
			translate([slotWH*0.875,0,0])cylinder(d=scrwBDia+0.1, h=slotWH*2);
	}
	translate([0,0,-20]){
			difference(){
					rcube([slotWH*4,slotWH,hB],3);
					translate([-slotWH*0.875,0,0])cylinder(d=scrwBDia-0.4, h=slotWH*2);
					translate([slotWH*0.875,0,0])cylinder(d=scrwBDia-0.4, h=slotWH*2);
					translate([-slotWH*1.5,0,hB/2])rotate([90,0,0])cylinder(d=scrwBDia-0.4, h=slotWH*2,center=true);
					translate([slotWH*1.5,0,hB/2])rotate([90,0,0])cylinder(d=scrwBDia-0.4, h=slotWH*2,center=true);
			}
	}
	
	difference(){
			//translate([0,-d/2, 0])rcube([w,d,hA],5);
			//translate([0,0,0])rotate([0,0,-angle/2+90])rotate_extrude(angle=angle)translate([doW/2,0, 0])square([hA,hA]);
			//translate([0,0, hA])rotate([0,0,-(angle+2)/2+90])rotate_extrude(angle=angle+2)translate([doW/2-hA+20,0, 0])circle(d=hA*2);
	}
	//translate([0,0, hA])rotate([0,0,-angle/2+90])rotate_extrude(angle=angle)translate([doW/2-ovrSnr,0, 0])square([hA+ovrSnr,hB]);
}

module rcube(size,radius){
  $fn=16;
  linear_extrude(height=size[2])
  if(radius>0){
  hull()
  {
      // place 4 circles in the corners, with the given radius
      translate([(-size[0]/2)+(radius), (-size[1]/2)+(radius), 0])
      circle(r=radius);

      translate([(size[0]/2)-(radius), (-size[1]/2)+(radius), 0])
      circle(r=radius);

      translate([(-size[0]/2)+(radius), (size[1]/2)-(radius), 0])
      circle(r=radius);

      translate([(size[0]/2)-(radius), (size[1]/2)-(radius), 0])
      circle(r=radius);
  }
  }
  if(radius==0){
    translate([0,0,size[2]/2])cube(size,center=true);
  }
}
